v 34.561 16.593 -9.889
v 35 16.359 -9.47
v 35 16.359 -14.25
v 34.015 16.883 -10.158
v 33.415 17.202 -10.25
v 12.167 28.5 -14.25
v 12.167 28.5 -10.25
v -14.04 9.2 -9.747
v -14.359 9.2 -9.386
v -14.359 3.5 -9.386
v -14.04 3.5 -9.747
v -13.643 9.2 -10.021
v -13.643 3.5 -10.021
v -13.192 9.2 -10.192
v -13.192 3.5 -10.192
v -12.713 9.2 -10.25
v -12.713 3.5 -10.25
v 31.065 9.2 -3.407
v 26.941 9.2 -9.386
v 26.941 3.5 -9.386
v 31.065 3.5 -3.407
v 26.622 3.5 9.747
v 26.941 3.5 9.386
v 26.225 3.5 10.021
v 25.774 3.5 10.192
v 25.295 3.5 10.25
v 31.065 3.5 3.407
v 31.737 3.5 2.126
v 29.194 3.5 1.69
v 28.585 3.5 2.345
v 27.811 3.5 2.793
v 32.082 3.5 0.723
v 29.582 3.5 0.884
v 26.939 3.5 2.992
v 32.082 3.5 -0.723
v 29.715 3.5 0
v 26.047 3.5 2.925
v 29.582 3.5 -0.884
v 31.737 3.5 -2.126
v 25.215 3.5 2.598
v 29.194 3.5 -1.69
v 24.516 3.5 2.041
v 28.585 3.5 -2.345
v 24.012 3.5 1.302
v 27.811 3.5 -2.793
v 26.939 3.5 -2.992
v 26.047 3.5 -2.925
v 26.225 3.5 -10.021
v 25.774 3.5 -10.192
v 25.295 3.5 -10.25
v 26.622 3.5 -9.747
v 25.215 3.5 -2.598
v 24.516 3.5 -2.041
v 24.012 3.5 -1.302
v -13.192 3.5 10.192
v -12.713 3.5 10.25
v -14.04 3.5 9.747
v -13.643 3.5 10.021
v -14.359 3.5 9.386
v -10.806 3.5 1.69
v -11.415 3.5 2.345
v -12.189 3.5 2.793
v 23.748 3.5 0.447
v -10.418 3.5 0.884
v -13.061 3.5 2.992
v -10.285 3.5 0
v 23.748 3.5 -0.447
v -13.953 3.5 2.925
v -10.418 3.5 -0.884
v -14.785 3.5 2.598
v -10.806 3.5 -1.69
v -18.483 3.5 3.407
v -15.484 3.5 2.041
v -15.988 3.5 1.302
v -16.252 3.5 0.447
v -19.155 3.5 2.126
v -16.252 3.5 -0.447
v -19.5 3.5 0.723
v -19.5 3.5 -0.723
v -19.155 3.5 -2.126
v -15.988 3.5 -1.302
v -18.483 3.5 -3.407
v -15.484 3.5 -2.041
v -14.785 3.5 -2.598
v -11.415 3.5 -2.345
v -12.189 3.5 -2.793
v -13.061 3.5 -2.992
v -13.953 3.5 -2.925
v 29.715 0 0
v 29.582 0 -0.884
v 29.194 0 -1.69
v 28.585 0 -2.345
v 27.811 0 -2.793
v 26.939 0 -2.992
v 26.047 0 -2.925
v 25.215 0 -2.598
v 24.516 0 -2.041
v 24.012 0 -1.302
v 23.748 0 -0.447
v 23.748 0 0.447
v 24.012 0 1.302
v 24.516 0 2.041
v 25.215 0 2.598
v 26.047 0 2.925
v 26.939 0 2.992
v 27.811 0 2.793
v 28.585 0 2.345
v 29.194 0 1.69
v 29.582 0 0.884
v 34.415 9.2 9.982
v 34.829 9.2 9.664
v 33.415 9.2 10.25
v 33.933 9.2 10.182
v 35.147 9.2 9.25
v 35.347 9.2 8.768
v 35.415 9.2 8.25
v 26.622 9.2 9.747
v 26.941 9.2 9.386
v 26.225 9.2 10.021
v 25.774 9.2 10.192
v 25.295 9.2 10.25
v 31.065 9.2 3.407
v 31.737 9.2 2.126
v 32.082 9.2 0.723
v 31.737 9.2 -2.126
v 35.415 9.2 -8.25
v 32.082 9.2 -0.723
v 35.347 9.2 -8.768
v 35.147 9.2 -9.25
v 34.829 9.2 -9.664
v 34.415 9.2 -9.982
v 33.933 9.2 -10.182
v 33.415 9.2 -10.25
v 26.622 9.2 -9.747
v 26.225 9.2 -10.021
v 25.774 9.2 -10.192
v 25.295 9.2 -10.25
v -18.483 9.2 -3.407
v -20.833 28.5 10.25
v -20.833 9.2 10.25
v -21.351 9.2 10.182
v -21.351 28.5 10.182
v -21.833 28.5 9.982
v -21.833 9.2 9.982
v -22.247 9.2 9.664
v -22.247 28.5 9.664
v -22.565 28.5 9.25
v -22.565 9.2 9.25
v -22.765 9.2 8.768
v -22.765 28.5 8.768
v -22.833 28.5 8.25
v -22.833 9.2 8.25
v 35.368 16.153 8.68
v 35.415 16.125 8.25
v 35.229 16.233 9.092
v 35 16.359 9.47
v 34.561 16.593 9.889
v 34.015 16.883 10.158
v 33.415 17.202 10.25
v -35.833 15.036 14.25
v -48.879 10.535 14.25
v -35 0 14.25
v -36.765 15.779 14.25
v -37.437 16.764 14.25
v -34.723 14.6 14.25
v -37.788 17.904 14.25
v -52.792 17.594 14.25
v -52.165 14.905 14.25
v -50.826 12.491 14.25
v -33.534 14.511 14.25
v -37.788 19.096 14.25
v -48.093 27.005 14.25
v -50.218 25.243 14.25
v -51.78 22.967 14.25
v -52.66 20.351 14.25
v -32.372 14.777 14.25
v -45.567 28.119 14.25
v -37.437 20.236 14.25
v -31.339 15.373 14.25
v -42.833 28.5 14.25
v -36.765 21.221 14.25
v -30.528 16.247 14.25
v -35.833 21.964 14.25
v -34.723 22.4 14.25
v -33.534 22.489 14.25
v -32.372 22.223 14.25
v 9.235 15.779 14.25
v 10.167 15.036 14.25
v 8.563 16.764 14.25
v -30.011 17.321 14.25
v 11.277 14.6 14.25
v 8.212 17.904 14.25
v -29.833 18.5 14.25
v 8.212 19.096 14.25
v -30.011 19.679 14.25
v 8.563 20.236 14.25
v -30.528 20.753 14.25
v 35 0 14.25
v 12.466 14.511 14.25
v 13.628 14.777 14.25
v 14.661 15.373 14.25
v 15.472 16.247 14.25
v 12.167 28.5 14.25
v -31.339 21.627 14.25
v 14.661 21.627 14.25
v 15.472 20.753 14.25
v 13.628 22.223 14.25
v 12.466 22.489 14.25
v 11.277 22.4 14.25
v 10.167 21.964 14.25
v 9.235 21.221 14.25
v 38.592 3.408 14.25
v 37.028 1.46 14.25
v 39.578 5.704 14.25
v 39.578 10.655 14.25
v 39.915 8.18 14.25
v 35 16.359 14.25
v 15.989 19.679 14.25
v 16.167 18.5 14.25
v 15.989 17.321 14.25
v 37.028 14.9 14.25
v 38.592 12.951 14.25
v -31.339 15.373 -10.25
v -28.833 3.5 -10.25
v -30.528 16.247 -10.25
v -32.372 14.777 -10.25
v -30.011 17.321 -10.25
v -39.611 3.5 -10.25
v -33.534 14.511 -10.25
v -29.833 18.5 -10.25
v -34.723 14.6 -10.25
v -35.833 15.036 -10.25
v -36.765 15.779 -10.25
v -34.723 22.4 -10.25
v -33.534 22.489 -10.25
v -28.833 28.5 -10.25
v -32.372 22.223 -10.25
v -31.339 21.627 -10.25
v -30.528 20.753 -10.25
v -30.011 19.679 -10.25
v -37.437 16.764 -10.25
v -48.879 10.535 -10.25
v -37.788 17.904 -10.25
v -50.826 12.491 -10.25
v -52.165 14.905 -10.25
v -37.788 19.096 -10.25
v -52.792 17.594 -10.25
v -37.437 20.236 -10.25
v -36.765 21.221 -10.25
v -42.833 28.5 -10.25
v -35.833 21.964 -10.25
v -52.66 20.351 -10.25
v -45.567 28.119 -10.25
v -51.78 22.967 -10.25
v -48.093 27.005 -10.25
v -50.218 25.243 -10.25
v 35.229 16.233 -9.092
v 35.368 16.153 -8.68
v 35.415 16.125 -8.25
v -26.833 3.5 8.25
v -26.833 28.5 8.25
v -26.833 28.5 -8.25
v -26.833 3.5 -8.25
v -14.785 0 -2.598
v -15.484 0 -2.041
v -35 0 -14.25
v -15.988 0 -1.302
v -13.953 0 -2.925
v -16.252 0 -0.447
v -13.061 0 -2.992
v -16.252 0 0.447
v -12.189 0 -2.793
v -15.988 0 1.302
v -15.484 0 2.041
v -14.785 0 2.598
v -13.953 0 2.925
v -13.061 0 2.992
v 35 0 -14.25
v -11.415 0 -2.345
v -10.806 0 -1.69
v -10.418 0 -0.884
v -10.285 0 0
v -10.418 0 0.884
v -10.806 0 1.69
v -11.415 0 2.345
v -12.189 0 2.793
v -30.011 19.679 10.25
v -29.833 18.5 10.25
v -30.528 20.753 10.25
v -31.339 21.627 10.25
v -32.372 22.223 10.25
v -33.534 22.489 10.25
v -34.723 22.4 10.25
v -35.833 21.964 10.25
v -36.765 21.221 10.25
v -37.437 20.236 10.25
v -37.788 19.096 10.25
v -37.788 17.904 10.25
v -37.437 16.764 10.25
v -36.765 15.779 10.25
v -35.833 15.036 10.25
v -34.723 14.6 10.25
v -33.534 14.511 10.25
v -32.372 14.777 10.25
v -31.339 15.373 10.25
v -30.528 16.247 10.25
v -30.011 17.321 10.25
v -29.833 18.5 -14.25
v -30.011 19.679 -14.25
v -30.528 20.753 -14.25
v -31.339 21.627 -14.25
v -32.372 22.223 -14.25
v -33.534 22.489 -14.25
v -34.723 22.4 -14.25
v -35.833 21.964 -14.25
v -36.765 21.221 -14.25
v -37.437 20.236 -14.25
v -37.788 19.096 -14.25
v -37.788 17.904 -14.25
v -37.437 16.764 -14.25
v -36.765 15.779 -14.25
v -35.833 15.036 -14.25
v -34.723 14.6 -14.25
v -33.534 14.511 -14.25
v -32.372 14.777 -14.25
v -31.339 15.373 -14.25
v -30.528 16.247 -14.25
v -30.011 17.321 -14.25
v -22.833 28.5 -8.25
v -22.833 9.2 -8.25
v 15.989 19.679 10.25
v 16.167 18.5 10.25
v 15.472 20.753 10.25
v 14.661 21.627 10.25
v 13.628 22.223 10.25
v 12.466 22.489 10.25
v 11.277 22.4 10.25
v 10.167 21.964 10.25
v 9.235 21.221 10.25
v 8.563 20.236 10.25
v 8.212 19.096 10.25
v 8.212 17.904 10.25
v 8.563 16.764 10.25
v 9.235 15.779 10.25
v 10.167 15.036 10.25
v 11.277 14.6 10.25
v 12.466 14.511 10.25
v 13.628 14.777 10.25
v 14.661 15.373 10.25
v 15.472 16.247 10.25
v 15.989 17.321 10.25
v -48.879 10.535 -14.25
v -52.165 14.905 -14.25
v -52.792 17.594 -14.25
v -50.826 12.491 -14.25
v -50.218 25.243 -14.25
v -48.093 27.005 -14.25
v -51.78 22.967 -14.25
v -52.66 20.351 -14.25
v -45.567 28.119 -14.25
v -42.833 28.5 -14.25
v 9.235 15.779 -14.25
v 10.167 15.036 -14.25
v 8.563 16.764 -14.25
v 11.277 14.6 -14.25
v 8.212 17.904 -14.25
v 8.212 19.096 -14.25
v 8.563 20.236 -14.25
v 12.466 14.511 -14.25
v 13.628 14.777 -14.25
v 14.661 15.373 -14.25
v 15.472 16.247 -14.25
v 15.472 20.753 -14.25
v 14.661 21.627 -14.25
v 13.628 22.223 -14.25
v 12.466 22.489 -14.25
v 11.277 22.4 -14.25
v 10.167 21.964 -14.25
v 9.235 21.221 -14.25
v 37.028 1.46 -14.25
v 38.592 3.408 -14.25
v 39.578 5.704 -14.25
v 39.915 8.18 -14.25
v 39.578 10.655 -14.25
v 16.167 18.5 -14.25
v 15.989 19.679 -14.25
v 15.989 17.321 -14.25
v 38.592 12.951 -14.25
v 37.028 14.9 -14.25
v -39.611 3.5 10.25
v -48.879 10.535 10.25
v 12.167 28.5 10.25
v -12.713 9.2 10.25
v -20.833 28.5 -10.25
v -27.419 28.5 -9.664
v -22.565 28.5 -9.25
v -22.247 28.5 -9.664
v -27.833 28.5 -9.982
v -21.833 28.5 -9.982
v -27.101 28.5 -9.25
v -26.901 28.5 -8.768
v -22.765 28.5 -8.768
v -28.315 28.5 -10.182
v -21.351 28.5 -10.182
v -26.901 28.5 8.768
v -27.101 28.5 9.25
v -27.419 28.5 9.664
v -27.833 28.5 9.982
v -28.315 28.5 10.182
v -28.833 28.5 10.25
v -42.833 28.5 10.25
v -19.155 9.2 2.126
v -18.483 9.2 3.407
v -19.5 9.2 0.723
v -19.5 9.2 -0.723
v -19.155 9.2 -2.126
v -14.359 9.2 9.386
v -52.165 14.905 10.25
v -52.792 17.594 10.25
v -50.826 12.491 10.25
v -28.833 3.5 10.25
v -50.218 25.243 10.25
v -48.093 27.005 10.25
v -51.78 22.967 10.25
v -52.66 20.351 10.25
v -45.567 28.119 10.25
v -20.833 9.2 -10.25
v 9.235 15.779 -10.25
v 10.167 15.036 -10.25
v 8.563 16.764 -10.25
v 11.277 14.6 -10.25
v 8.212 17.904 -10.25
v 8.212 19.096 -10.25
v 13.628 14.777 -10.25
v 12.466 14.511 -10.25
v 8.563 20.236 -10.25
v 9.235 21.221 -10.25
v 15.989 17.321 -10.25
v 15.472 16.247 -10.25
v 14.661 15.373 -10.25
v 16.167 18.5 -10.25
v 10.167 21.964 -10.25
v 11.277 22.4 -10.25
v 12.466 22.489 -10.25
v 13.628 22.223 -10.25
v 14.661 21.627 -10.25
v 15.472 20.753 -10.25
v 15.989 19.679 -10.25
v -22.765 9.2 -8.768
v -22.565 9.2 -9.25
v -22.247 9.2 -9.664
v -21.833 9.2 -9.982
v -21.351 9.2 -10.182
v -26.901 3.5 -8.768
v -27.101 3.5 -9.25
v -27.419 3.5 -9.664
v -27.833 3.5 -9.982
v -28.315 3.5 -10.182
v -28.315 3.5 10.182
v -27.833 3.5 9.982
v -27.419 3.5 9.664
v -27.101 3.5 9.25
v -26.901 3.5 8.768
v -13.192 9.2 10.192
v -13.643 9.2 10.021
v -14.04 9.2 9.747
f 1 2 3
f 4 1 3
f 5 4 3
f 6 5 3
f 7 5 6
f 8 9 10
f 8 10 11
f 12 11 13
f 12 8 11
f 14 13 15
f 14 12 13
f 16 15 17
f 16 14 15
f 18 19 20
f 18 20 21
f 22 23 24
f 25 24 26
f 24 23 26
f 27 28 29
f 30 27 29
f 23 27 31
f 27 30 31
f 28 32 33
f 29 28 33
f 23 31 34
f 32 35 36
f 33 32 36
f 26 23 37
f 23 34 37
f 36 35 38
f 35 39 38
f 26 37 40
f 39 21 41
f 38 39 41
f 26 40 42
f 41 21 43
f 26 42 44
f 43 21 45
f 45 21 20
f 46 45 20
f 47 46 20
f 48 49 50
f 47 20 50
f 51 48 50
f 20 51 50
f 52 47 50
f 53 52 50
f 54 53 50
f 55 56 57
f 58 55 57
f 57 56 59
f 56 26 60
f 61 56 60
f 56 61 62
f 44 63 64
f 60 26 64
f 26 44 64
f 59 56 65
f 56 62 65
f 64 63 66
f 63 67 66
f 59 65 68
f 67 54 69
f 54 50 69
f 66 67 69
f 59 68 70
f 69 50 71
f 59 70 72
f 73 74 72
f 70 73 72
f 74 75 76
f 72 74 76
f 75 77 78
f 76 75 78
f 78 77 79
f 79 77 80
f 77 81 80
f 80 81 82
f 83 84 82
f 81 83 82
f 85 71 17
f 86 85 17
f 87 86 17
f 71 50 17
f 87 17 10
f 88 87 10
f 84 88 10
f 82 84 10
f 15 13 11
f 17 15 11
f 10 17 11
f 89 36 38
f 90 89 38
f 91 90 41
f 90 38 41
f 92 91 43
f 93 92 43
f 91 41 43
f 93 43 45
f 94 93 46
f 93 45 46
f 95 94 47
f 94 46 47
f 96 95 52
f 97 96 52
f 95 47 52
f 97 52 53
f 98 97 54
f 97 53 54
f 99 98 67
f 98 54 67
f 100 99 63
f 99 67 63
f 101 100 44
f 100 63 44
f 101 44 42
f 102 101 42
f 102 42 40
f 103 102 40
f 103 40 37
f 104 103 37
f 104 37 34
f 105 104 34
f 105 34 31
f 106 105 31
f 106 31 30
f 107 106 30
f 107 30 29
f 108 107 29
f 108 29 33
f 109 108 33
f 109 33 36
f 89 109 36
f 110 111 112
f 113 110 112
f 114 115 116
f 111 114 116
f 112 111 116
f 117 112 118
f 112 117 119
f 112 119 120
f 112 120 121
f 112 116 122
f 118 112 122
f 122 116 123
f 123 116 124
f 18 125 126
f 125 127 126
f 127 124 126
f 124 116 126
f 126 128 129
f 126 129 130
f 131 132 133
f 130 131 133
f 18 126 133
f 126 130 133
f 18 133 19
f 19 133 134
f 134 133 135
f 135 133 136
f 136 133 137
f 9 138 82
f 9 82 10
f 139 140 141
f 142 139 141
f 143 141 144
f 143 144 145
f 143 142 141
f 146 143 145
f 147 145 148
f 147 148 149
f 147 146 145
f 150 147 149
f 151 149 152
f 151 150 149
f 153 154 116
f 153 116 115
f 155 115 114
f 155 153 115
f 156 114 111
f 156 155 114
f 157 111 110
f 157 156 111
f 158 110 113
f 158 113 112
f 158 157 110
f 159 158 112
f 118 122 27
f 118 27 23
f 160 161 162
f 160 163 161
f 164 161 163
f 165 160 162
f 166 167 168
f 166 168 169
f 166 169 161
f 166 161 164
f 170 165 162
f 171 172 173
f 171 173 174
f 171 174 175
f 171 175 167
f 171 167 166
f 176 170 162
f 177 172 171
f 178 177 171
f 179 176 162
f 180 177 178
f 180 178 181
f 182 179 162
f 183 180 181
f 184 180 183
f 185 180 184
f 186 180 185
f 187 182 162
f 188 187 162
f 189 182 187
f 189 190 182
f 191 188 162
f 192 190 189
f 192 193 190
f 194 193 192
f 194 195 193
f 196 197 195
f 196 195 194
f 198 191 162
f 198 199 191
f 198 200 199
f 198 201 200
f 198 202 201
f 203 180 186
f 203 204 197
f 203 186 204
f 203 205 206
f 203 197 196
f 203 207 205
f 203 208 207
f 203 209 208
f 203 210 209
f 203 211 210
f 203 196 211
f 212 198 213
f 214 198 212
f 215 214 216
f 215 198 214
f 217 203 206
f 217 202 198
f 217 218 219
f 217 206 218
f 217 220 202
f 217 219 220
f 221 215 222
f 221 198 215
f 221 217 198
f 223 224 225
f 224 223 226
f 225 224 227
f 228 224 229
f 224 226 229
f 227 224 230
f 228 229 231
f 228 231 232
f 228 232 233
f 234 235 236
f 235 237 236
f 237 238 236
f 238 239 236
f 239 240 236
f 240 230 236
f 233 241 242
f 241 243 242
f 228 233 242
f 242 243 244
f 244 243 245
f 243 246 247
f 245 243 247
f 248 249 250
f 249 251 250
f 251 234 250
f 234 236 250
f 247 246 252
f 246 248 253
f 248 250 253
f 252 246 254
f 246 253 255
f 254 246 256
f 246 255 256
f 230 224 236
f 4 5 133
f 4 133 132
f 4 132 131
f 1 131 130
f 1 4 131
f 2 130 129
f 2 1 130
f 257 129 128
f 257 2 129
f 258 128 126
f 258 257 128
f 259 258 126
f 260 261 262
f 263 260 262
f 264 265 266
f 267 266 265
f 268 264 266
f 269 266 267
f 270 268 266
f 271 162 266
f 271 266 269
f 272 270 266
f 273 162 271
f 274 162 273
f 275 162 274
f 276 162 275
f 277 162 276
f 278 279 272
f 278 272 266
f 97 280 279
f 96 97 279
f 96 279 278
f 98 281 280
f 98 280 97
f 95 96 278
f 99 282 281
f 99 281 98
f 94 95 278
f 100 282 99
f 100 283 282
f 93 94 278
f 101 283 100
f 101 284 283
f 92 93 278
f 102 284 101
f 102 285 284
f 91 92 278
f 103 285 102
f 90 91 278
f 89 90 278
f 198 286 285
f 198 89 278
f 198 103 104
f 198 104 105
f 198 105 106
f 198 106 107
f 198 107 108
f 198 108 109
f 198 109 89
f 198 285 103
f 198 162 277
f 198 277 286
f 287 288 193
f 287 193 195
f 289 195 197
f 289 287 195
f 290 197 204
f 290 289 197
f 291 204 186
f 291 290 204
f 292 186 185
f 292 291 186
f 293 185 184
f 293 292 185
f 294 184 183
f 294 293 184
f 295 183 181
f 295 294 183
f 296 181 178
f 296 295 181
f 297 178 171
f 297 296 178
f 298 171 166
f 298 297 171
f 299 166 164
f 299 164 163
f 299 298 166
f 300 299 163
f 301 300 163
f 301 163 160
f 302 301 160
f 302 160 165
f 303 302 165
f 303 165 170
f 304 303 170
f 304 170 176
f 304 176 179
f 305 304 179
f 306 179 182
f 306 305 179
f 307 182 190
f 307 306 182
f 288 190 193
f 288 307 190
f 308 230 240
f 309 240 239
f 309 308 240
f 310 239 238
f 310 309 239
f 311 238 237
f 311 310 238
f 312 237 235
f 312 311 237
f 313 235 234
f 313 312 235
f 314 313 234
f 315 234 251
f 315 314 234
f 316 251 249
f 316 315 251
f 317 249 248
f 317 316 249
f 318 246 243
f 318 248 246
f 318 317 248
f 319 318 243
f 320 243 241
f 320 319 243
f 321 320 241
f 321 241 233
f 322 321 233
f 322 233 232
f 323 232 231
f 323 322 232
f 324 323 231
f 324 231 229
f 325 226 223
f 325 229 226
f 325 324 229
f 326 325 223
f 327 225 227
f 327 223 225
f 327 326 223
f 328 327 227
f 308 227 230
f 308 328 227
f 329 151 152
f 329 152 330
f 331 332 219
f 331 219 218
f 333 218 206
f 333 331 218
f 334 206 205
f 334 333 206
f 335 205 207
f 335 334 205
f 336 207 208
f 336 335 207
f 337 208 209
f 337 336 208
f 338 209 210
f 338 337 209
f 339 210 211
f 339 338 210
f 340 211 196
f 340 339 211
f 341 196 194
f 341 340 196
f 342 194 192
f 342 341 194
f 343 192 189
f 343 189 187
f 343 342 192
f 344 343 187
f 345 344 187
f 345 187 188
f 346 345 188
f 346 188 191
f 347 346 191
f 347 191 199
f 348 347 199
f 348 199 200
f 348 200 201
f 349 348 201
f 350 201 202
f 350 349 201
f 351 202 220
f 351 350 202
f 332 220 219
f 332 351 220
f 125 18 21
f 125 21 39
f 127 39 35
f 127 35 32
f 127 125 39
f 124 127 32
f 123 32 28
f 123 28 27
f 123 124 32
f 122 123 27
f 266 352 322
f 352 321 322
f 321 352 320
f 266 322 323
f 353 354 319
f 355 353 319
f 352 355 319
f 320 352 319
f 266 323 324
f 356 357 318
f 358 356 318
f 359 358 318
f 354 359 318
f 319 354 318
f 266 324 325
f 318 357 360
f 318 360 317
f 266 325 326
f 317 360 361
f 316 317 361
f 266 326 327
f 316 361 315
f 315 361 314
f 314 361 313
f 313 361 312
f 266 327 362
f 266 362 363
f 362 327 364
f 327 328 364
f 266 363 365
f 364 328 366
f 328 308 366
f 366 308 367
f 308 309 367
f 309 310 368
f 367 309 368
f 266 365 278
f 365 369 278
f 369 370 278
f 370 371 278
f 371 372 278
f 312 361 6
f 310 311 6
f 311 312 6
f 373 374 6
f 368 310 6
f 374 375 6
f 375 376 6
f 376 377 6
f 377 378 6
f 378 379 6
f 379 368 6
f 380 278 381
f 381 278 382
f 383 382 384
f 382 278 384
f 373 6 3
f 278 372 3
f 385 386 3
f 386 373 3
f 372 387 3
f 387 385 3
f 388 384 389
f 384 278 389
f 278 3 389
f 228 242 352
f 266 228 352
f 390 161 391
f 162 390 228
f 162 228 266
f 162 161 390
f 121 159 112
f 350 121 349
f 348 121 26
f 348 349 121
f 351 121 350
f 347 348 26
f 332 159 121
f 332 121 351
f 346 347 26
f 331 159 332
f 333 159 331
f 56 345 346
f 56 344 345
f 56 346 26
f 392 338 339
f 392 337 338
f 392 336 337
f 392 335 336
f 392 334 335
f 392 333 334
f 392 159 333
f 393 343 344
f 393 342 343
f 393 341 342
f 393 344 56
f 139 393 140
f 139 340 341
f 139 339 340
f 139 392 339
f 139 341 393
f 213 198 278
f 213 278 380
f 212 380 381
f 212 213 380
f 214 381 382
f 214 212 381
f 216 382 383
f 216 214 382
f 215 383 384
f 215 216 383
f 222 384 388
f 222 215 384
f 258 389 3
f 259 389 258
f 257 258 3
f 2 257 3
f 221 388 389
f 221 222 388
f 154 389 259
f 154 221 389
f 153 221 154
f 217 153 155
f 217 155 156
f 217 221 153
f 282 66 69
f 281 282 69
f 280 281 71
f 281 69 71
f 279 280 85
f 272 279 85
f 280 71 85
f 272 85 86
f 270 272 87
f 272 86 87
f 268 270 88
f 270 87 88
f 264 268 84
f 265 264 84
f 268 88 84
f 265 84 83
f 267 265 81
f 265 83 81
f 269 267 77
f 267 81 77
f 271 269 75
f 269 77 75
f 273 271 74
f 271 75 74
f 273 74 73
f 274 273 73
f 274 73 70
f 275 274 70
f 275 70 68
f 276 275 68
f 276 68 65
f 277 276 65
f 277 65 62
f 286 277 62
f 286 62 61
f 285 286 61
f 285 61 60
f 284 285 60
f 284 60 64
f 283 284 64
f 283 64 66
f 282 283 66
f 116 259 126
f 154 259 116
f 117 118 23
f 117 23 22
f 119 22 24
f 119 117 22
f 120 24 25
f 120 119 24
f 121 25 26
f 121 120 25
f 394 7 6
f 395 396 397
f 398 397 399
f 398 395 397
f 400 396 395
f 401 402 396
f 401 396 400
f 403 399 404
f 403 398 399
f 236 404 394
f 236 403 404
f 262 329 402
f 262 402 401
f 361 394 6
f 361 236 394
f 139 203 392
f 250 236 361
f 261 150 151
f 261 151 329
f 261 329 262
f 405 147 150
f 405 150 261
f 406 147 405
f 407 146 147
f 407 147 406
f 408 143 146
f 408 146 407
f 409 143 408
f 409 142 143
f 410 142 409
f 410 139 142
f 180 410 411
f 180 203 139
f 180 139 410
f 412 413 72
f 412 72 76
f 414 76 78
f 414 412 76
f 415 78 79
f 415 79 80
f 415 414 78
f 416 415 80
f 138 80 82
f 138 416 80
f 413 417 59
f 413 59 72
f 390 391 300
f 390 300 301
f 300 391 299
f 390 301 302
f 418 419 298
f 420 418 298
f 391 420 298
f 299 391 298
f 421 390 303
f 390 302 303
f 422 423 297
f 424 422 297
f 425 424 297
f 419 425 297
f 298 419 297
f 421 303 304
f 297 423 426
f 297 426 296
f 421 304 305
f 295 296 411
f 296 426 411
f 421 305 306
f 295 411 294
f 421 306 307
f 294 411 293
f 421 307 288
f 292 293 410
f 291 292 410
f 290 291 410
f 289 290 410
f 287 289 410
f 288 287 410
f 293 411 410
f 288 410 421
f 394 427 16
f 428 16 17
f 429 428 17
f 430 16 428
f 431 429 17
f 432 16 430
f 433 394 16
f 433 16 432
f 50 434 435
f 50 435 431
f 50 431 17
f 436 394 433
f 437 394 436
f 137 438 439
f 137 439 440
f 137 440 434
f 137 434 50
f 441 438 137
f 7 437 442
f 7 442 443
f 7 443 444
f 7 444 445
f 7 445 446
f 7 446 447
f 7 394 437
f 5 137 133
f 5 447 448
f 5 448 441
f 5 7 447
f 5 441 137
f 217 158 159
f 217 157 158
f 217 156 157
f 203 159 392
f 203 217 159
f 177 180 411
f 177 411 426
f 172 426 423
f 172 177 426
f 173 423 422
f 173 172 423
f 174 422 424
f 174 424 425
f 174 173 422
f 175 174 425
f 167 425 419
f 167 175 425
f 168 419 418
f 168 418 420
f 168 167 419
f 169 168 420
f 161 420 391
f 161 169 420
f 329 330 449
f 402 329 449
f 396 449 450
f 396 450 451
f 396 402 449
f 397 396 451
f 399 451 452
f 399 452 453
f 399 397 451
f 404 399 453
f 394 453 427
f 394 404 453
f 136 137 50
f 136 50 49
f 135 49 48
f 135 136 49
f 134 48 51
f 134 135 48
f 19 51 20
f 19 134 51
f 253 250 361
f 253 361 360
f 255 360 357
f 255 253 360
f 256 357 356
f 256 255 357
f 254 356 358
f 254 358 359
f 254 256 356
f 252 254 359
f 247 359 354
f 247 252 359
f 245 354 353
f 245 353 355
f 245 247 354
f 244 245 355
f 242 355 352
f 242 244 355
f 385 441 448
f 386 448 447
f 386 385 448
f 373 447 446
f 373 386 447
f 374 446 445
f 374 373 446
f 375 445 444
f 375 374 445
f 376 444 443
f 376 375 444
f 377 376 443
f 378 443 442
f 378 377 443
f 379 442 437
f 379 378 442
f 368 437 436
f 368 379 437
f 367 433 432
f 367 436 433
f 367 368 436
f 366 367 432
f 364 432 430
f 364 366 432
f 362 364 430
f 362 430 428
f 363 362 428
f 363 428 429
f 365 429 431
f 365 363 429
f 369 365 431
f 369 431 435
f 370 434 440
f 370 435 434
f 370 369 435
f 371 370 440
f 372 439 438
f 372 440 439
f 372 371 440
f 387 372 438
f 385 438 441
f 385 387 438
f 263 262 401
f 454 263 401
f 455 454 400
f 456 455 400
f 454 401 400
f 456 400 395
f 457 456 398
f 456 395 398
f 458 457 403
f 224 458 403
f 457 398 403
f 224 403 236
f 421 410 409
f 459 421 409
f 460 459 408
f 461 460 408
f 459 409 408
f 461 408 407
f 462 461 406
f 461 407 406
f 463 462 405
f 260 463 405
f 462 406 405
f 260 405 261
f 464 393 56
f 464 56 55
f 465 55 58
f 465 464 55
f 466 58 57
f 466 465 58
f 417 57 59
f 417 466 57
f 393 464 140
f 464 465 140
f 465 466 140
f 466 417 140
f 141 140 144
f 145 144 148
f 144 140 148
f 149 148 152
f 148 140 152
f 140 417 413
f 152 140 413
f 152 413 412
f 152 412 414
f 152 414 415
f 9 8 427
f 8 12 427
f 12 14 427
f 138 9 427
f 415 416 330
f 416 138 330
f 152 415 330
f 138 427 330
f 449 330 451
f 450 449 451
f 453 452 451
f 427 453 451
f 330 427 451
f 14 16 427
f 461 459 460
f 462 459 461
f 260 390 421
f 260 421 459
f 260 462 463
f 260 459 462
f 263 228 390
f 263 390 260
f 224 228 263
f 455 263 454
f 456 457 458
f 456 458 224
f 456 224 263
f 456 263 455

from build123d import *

# Parameters (mm, degrees)
SKETCH1_R           = 4
BOSS_EXTRUDE1_DEPTH = 14.25
SKETCH3_W           = 10
SKETCH3_H           = 20.5
CUT_EXTRUDE1_DEPTH  = 25
CUT_EXTRUDE2_DEPTH  = 19.3
CUT_EXTRUDE3_DEPTH  = 5.7
SKETCH7_R           = 3
CUT_EXTRUDE4_DEPTH  = 4.5000001


with BuildPart() as part:
    # Sketch1 → Boss-Extrude1 (new body, symmetric)
    with BuildSketch(Plane.XY):
        with BuildLine():
            Line((-35, 0), (35, 0))
            ThreePointArc((35, 0), (39.914888853, 8.179748676), (35, 16.359497352))
            Line((35, 16.359497352), (12.167035368, 28.5))
            Line((12.167035368, 28.5), (-42.832964632, 28.5))
            ThreePointArc((-42.832964632, 28.5), (-52.310648732, 21.689593093), (-48.878955781, 10.53470082))
            Line((-48.878955781, 10.53470082), (-35, 0))
        make_face()
        with Locations((12.167035368, 18.5)):
            Circle(SKETCH1_R, mode=Mode.SUBTRACT)
        with Locations((-33.832964632, 18.5)):
            Circle(SKETCH1_R, mode=Mode.SUBTRACT)
    extrude(amount=BOSS_EXTRUDE1_DEPTH, both=True)

    # Sketch3 → Cut-Extrude1 (cut)
    with BuildSketch(Plane(origin=(0, 28.5, 0), x_dir=(1, 0, 0), z_dir=(0, 1, 0))):
        with BuildLine():
            Line((-28.832964632, 10.25), (-42.832964632, 10.25))
            Line((-42.832964632, 10.25), (-42.832964632, -10.25))
            Line((-42.832964632, -10.25), (-28.832964632, -10.25))
            ThreePointArc((-28.832964632, -10.25), (-27.41875107, -9.664213562), (-26.832964632, -8.25))
            Line((-26.832964632, -8.25), (-26.832964632, 8.25))
            ThreePointArc((-26.832964632, 8.25), (-27.41875107, 9.664213562), (-28.832964632, 10.25))
        make_face()
        with Locations((-47.832964632, 0)):
            Rectangle(SKETCH3_W, SKETCH3_H)
    extrude(amount=-CUT_EXTRUDE1_DEPTH, mode=Mode.SUBTRACT)

    # Sketch3<3> → Cut-Extrude2 (cut)
    with BuildSketch(Plane(origin=(0, 28.5, 0), x_dir=(1, 0, 0), z_dir=(0, 1, 0))):
        with BuildLine():
            Line((-20.832964632, 10.25), (33.414888853, 10.25))
            ThreePointArc((33.414888853, 10.25), (34.829102415, 9.664213562), (35.414888853, 8.25))
            Line((35.414888853, 8.25), (35.414888853, -8.25))
            ThreePointArc((35.414888853, -8.25), (34.829102415, -9.664213562), (33.414888853, -10.25))
            Line((33.414888853, -10.25), (-20.832964632, -10.25))
            ThreePointArc((-20.832964632, -10.25), (-22.247178195, -9.664213562), (-22.832964632, -8.25))
            Line((-22.832964632, -8.25), (-22.832964632, 8.25))
            ThreePointArc((-22.832964632, 8.25), (-22.247178195, 9.664213562), (-20.832964632, 10.25))
        make_face()
    extrude(amount=-CUT_EXTRUDE2_DEPTH, mode=Mode.SUBTRACT)

    # Sketch6 → Cut-Extrude3 (cut)
    with BuildSketch(Plane(origin=(0, 9.2, 0), x_dir=(1, 0, 0), z_dir=(0, 1, 0))):
        with BuildLine():
            Line((-18.48327062, 3.406663741), (-14.359422457, 9.38555458))
            ThreePointArc((-14.359422457, 9.38555458), (-13.64281361, 10.020749723), (-12.71305804, 10.25))
            Line((-12.71305804, 10.25), (25.29498226, 10.25))
            ThreePointArc((25.29498226, 10.25), (26.22473783, 10.020749723), (26.941346678, 9.38555458))
            Line((26.941346678, 9.38555458), (31.06519484, 3.406663741))
            ThreePointArc((31.06519484, 3.406663741), (32.126101588, 0), (31.06519484, -3.406663741))
            Line((31.06519484, -3.406663741), (26.941346678, -9.38555458))
            ThreePointArc((26.941346678, -9.38555458), (26.22473783, -10.020749723), (25.29498226, -10.25))
            Line((25.29498226, -10.25), (-12.71305804, -10.25))
            ThreePointArc((-12.71305804, -10.25), (-13.64281361, -10.020749723), (-14.359422457, -9.38555458))
            Line((-14.359422457, -9.38555458), (-18.48327062, -3.406663741))
            ThreePointArc((-18.48327062, -3.406663741), (-19.544177367, 0), (-18.48327062, 3.406663741))
        make_face()
    extrude(amount=-CUT_EXTRUDE3_DEPTH, mode=Mode.SUBTRACT)

    # Sketch7 → Cut-Extrude4 (cut, through all)
    with BuildSketch(Plane(origin=(0, 3.5, 0), x_dir=(1, 0, 0), z_dir=(0, 1, 0))):
        with Locations((26.714888853, 0)):
            Circle(SKETCH7_R)
        with Locations((-13.285111147, 0)):
            Circle(SKETCH7_R)
    extrude(amount=-CUT_EXTRUDE4_DEPTH, mode=Mode.SUBTRACT)


solid = part.part
